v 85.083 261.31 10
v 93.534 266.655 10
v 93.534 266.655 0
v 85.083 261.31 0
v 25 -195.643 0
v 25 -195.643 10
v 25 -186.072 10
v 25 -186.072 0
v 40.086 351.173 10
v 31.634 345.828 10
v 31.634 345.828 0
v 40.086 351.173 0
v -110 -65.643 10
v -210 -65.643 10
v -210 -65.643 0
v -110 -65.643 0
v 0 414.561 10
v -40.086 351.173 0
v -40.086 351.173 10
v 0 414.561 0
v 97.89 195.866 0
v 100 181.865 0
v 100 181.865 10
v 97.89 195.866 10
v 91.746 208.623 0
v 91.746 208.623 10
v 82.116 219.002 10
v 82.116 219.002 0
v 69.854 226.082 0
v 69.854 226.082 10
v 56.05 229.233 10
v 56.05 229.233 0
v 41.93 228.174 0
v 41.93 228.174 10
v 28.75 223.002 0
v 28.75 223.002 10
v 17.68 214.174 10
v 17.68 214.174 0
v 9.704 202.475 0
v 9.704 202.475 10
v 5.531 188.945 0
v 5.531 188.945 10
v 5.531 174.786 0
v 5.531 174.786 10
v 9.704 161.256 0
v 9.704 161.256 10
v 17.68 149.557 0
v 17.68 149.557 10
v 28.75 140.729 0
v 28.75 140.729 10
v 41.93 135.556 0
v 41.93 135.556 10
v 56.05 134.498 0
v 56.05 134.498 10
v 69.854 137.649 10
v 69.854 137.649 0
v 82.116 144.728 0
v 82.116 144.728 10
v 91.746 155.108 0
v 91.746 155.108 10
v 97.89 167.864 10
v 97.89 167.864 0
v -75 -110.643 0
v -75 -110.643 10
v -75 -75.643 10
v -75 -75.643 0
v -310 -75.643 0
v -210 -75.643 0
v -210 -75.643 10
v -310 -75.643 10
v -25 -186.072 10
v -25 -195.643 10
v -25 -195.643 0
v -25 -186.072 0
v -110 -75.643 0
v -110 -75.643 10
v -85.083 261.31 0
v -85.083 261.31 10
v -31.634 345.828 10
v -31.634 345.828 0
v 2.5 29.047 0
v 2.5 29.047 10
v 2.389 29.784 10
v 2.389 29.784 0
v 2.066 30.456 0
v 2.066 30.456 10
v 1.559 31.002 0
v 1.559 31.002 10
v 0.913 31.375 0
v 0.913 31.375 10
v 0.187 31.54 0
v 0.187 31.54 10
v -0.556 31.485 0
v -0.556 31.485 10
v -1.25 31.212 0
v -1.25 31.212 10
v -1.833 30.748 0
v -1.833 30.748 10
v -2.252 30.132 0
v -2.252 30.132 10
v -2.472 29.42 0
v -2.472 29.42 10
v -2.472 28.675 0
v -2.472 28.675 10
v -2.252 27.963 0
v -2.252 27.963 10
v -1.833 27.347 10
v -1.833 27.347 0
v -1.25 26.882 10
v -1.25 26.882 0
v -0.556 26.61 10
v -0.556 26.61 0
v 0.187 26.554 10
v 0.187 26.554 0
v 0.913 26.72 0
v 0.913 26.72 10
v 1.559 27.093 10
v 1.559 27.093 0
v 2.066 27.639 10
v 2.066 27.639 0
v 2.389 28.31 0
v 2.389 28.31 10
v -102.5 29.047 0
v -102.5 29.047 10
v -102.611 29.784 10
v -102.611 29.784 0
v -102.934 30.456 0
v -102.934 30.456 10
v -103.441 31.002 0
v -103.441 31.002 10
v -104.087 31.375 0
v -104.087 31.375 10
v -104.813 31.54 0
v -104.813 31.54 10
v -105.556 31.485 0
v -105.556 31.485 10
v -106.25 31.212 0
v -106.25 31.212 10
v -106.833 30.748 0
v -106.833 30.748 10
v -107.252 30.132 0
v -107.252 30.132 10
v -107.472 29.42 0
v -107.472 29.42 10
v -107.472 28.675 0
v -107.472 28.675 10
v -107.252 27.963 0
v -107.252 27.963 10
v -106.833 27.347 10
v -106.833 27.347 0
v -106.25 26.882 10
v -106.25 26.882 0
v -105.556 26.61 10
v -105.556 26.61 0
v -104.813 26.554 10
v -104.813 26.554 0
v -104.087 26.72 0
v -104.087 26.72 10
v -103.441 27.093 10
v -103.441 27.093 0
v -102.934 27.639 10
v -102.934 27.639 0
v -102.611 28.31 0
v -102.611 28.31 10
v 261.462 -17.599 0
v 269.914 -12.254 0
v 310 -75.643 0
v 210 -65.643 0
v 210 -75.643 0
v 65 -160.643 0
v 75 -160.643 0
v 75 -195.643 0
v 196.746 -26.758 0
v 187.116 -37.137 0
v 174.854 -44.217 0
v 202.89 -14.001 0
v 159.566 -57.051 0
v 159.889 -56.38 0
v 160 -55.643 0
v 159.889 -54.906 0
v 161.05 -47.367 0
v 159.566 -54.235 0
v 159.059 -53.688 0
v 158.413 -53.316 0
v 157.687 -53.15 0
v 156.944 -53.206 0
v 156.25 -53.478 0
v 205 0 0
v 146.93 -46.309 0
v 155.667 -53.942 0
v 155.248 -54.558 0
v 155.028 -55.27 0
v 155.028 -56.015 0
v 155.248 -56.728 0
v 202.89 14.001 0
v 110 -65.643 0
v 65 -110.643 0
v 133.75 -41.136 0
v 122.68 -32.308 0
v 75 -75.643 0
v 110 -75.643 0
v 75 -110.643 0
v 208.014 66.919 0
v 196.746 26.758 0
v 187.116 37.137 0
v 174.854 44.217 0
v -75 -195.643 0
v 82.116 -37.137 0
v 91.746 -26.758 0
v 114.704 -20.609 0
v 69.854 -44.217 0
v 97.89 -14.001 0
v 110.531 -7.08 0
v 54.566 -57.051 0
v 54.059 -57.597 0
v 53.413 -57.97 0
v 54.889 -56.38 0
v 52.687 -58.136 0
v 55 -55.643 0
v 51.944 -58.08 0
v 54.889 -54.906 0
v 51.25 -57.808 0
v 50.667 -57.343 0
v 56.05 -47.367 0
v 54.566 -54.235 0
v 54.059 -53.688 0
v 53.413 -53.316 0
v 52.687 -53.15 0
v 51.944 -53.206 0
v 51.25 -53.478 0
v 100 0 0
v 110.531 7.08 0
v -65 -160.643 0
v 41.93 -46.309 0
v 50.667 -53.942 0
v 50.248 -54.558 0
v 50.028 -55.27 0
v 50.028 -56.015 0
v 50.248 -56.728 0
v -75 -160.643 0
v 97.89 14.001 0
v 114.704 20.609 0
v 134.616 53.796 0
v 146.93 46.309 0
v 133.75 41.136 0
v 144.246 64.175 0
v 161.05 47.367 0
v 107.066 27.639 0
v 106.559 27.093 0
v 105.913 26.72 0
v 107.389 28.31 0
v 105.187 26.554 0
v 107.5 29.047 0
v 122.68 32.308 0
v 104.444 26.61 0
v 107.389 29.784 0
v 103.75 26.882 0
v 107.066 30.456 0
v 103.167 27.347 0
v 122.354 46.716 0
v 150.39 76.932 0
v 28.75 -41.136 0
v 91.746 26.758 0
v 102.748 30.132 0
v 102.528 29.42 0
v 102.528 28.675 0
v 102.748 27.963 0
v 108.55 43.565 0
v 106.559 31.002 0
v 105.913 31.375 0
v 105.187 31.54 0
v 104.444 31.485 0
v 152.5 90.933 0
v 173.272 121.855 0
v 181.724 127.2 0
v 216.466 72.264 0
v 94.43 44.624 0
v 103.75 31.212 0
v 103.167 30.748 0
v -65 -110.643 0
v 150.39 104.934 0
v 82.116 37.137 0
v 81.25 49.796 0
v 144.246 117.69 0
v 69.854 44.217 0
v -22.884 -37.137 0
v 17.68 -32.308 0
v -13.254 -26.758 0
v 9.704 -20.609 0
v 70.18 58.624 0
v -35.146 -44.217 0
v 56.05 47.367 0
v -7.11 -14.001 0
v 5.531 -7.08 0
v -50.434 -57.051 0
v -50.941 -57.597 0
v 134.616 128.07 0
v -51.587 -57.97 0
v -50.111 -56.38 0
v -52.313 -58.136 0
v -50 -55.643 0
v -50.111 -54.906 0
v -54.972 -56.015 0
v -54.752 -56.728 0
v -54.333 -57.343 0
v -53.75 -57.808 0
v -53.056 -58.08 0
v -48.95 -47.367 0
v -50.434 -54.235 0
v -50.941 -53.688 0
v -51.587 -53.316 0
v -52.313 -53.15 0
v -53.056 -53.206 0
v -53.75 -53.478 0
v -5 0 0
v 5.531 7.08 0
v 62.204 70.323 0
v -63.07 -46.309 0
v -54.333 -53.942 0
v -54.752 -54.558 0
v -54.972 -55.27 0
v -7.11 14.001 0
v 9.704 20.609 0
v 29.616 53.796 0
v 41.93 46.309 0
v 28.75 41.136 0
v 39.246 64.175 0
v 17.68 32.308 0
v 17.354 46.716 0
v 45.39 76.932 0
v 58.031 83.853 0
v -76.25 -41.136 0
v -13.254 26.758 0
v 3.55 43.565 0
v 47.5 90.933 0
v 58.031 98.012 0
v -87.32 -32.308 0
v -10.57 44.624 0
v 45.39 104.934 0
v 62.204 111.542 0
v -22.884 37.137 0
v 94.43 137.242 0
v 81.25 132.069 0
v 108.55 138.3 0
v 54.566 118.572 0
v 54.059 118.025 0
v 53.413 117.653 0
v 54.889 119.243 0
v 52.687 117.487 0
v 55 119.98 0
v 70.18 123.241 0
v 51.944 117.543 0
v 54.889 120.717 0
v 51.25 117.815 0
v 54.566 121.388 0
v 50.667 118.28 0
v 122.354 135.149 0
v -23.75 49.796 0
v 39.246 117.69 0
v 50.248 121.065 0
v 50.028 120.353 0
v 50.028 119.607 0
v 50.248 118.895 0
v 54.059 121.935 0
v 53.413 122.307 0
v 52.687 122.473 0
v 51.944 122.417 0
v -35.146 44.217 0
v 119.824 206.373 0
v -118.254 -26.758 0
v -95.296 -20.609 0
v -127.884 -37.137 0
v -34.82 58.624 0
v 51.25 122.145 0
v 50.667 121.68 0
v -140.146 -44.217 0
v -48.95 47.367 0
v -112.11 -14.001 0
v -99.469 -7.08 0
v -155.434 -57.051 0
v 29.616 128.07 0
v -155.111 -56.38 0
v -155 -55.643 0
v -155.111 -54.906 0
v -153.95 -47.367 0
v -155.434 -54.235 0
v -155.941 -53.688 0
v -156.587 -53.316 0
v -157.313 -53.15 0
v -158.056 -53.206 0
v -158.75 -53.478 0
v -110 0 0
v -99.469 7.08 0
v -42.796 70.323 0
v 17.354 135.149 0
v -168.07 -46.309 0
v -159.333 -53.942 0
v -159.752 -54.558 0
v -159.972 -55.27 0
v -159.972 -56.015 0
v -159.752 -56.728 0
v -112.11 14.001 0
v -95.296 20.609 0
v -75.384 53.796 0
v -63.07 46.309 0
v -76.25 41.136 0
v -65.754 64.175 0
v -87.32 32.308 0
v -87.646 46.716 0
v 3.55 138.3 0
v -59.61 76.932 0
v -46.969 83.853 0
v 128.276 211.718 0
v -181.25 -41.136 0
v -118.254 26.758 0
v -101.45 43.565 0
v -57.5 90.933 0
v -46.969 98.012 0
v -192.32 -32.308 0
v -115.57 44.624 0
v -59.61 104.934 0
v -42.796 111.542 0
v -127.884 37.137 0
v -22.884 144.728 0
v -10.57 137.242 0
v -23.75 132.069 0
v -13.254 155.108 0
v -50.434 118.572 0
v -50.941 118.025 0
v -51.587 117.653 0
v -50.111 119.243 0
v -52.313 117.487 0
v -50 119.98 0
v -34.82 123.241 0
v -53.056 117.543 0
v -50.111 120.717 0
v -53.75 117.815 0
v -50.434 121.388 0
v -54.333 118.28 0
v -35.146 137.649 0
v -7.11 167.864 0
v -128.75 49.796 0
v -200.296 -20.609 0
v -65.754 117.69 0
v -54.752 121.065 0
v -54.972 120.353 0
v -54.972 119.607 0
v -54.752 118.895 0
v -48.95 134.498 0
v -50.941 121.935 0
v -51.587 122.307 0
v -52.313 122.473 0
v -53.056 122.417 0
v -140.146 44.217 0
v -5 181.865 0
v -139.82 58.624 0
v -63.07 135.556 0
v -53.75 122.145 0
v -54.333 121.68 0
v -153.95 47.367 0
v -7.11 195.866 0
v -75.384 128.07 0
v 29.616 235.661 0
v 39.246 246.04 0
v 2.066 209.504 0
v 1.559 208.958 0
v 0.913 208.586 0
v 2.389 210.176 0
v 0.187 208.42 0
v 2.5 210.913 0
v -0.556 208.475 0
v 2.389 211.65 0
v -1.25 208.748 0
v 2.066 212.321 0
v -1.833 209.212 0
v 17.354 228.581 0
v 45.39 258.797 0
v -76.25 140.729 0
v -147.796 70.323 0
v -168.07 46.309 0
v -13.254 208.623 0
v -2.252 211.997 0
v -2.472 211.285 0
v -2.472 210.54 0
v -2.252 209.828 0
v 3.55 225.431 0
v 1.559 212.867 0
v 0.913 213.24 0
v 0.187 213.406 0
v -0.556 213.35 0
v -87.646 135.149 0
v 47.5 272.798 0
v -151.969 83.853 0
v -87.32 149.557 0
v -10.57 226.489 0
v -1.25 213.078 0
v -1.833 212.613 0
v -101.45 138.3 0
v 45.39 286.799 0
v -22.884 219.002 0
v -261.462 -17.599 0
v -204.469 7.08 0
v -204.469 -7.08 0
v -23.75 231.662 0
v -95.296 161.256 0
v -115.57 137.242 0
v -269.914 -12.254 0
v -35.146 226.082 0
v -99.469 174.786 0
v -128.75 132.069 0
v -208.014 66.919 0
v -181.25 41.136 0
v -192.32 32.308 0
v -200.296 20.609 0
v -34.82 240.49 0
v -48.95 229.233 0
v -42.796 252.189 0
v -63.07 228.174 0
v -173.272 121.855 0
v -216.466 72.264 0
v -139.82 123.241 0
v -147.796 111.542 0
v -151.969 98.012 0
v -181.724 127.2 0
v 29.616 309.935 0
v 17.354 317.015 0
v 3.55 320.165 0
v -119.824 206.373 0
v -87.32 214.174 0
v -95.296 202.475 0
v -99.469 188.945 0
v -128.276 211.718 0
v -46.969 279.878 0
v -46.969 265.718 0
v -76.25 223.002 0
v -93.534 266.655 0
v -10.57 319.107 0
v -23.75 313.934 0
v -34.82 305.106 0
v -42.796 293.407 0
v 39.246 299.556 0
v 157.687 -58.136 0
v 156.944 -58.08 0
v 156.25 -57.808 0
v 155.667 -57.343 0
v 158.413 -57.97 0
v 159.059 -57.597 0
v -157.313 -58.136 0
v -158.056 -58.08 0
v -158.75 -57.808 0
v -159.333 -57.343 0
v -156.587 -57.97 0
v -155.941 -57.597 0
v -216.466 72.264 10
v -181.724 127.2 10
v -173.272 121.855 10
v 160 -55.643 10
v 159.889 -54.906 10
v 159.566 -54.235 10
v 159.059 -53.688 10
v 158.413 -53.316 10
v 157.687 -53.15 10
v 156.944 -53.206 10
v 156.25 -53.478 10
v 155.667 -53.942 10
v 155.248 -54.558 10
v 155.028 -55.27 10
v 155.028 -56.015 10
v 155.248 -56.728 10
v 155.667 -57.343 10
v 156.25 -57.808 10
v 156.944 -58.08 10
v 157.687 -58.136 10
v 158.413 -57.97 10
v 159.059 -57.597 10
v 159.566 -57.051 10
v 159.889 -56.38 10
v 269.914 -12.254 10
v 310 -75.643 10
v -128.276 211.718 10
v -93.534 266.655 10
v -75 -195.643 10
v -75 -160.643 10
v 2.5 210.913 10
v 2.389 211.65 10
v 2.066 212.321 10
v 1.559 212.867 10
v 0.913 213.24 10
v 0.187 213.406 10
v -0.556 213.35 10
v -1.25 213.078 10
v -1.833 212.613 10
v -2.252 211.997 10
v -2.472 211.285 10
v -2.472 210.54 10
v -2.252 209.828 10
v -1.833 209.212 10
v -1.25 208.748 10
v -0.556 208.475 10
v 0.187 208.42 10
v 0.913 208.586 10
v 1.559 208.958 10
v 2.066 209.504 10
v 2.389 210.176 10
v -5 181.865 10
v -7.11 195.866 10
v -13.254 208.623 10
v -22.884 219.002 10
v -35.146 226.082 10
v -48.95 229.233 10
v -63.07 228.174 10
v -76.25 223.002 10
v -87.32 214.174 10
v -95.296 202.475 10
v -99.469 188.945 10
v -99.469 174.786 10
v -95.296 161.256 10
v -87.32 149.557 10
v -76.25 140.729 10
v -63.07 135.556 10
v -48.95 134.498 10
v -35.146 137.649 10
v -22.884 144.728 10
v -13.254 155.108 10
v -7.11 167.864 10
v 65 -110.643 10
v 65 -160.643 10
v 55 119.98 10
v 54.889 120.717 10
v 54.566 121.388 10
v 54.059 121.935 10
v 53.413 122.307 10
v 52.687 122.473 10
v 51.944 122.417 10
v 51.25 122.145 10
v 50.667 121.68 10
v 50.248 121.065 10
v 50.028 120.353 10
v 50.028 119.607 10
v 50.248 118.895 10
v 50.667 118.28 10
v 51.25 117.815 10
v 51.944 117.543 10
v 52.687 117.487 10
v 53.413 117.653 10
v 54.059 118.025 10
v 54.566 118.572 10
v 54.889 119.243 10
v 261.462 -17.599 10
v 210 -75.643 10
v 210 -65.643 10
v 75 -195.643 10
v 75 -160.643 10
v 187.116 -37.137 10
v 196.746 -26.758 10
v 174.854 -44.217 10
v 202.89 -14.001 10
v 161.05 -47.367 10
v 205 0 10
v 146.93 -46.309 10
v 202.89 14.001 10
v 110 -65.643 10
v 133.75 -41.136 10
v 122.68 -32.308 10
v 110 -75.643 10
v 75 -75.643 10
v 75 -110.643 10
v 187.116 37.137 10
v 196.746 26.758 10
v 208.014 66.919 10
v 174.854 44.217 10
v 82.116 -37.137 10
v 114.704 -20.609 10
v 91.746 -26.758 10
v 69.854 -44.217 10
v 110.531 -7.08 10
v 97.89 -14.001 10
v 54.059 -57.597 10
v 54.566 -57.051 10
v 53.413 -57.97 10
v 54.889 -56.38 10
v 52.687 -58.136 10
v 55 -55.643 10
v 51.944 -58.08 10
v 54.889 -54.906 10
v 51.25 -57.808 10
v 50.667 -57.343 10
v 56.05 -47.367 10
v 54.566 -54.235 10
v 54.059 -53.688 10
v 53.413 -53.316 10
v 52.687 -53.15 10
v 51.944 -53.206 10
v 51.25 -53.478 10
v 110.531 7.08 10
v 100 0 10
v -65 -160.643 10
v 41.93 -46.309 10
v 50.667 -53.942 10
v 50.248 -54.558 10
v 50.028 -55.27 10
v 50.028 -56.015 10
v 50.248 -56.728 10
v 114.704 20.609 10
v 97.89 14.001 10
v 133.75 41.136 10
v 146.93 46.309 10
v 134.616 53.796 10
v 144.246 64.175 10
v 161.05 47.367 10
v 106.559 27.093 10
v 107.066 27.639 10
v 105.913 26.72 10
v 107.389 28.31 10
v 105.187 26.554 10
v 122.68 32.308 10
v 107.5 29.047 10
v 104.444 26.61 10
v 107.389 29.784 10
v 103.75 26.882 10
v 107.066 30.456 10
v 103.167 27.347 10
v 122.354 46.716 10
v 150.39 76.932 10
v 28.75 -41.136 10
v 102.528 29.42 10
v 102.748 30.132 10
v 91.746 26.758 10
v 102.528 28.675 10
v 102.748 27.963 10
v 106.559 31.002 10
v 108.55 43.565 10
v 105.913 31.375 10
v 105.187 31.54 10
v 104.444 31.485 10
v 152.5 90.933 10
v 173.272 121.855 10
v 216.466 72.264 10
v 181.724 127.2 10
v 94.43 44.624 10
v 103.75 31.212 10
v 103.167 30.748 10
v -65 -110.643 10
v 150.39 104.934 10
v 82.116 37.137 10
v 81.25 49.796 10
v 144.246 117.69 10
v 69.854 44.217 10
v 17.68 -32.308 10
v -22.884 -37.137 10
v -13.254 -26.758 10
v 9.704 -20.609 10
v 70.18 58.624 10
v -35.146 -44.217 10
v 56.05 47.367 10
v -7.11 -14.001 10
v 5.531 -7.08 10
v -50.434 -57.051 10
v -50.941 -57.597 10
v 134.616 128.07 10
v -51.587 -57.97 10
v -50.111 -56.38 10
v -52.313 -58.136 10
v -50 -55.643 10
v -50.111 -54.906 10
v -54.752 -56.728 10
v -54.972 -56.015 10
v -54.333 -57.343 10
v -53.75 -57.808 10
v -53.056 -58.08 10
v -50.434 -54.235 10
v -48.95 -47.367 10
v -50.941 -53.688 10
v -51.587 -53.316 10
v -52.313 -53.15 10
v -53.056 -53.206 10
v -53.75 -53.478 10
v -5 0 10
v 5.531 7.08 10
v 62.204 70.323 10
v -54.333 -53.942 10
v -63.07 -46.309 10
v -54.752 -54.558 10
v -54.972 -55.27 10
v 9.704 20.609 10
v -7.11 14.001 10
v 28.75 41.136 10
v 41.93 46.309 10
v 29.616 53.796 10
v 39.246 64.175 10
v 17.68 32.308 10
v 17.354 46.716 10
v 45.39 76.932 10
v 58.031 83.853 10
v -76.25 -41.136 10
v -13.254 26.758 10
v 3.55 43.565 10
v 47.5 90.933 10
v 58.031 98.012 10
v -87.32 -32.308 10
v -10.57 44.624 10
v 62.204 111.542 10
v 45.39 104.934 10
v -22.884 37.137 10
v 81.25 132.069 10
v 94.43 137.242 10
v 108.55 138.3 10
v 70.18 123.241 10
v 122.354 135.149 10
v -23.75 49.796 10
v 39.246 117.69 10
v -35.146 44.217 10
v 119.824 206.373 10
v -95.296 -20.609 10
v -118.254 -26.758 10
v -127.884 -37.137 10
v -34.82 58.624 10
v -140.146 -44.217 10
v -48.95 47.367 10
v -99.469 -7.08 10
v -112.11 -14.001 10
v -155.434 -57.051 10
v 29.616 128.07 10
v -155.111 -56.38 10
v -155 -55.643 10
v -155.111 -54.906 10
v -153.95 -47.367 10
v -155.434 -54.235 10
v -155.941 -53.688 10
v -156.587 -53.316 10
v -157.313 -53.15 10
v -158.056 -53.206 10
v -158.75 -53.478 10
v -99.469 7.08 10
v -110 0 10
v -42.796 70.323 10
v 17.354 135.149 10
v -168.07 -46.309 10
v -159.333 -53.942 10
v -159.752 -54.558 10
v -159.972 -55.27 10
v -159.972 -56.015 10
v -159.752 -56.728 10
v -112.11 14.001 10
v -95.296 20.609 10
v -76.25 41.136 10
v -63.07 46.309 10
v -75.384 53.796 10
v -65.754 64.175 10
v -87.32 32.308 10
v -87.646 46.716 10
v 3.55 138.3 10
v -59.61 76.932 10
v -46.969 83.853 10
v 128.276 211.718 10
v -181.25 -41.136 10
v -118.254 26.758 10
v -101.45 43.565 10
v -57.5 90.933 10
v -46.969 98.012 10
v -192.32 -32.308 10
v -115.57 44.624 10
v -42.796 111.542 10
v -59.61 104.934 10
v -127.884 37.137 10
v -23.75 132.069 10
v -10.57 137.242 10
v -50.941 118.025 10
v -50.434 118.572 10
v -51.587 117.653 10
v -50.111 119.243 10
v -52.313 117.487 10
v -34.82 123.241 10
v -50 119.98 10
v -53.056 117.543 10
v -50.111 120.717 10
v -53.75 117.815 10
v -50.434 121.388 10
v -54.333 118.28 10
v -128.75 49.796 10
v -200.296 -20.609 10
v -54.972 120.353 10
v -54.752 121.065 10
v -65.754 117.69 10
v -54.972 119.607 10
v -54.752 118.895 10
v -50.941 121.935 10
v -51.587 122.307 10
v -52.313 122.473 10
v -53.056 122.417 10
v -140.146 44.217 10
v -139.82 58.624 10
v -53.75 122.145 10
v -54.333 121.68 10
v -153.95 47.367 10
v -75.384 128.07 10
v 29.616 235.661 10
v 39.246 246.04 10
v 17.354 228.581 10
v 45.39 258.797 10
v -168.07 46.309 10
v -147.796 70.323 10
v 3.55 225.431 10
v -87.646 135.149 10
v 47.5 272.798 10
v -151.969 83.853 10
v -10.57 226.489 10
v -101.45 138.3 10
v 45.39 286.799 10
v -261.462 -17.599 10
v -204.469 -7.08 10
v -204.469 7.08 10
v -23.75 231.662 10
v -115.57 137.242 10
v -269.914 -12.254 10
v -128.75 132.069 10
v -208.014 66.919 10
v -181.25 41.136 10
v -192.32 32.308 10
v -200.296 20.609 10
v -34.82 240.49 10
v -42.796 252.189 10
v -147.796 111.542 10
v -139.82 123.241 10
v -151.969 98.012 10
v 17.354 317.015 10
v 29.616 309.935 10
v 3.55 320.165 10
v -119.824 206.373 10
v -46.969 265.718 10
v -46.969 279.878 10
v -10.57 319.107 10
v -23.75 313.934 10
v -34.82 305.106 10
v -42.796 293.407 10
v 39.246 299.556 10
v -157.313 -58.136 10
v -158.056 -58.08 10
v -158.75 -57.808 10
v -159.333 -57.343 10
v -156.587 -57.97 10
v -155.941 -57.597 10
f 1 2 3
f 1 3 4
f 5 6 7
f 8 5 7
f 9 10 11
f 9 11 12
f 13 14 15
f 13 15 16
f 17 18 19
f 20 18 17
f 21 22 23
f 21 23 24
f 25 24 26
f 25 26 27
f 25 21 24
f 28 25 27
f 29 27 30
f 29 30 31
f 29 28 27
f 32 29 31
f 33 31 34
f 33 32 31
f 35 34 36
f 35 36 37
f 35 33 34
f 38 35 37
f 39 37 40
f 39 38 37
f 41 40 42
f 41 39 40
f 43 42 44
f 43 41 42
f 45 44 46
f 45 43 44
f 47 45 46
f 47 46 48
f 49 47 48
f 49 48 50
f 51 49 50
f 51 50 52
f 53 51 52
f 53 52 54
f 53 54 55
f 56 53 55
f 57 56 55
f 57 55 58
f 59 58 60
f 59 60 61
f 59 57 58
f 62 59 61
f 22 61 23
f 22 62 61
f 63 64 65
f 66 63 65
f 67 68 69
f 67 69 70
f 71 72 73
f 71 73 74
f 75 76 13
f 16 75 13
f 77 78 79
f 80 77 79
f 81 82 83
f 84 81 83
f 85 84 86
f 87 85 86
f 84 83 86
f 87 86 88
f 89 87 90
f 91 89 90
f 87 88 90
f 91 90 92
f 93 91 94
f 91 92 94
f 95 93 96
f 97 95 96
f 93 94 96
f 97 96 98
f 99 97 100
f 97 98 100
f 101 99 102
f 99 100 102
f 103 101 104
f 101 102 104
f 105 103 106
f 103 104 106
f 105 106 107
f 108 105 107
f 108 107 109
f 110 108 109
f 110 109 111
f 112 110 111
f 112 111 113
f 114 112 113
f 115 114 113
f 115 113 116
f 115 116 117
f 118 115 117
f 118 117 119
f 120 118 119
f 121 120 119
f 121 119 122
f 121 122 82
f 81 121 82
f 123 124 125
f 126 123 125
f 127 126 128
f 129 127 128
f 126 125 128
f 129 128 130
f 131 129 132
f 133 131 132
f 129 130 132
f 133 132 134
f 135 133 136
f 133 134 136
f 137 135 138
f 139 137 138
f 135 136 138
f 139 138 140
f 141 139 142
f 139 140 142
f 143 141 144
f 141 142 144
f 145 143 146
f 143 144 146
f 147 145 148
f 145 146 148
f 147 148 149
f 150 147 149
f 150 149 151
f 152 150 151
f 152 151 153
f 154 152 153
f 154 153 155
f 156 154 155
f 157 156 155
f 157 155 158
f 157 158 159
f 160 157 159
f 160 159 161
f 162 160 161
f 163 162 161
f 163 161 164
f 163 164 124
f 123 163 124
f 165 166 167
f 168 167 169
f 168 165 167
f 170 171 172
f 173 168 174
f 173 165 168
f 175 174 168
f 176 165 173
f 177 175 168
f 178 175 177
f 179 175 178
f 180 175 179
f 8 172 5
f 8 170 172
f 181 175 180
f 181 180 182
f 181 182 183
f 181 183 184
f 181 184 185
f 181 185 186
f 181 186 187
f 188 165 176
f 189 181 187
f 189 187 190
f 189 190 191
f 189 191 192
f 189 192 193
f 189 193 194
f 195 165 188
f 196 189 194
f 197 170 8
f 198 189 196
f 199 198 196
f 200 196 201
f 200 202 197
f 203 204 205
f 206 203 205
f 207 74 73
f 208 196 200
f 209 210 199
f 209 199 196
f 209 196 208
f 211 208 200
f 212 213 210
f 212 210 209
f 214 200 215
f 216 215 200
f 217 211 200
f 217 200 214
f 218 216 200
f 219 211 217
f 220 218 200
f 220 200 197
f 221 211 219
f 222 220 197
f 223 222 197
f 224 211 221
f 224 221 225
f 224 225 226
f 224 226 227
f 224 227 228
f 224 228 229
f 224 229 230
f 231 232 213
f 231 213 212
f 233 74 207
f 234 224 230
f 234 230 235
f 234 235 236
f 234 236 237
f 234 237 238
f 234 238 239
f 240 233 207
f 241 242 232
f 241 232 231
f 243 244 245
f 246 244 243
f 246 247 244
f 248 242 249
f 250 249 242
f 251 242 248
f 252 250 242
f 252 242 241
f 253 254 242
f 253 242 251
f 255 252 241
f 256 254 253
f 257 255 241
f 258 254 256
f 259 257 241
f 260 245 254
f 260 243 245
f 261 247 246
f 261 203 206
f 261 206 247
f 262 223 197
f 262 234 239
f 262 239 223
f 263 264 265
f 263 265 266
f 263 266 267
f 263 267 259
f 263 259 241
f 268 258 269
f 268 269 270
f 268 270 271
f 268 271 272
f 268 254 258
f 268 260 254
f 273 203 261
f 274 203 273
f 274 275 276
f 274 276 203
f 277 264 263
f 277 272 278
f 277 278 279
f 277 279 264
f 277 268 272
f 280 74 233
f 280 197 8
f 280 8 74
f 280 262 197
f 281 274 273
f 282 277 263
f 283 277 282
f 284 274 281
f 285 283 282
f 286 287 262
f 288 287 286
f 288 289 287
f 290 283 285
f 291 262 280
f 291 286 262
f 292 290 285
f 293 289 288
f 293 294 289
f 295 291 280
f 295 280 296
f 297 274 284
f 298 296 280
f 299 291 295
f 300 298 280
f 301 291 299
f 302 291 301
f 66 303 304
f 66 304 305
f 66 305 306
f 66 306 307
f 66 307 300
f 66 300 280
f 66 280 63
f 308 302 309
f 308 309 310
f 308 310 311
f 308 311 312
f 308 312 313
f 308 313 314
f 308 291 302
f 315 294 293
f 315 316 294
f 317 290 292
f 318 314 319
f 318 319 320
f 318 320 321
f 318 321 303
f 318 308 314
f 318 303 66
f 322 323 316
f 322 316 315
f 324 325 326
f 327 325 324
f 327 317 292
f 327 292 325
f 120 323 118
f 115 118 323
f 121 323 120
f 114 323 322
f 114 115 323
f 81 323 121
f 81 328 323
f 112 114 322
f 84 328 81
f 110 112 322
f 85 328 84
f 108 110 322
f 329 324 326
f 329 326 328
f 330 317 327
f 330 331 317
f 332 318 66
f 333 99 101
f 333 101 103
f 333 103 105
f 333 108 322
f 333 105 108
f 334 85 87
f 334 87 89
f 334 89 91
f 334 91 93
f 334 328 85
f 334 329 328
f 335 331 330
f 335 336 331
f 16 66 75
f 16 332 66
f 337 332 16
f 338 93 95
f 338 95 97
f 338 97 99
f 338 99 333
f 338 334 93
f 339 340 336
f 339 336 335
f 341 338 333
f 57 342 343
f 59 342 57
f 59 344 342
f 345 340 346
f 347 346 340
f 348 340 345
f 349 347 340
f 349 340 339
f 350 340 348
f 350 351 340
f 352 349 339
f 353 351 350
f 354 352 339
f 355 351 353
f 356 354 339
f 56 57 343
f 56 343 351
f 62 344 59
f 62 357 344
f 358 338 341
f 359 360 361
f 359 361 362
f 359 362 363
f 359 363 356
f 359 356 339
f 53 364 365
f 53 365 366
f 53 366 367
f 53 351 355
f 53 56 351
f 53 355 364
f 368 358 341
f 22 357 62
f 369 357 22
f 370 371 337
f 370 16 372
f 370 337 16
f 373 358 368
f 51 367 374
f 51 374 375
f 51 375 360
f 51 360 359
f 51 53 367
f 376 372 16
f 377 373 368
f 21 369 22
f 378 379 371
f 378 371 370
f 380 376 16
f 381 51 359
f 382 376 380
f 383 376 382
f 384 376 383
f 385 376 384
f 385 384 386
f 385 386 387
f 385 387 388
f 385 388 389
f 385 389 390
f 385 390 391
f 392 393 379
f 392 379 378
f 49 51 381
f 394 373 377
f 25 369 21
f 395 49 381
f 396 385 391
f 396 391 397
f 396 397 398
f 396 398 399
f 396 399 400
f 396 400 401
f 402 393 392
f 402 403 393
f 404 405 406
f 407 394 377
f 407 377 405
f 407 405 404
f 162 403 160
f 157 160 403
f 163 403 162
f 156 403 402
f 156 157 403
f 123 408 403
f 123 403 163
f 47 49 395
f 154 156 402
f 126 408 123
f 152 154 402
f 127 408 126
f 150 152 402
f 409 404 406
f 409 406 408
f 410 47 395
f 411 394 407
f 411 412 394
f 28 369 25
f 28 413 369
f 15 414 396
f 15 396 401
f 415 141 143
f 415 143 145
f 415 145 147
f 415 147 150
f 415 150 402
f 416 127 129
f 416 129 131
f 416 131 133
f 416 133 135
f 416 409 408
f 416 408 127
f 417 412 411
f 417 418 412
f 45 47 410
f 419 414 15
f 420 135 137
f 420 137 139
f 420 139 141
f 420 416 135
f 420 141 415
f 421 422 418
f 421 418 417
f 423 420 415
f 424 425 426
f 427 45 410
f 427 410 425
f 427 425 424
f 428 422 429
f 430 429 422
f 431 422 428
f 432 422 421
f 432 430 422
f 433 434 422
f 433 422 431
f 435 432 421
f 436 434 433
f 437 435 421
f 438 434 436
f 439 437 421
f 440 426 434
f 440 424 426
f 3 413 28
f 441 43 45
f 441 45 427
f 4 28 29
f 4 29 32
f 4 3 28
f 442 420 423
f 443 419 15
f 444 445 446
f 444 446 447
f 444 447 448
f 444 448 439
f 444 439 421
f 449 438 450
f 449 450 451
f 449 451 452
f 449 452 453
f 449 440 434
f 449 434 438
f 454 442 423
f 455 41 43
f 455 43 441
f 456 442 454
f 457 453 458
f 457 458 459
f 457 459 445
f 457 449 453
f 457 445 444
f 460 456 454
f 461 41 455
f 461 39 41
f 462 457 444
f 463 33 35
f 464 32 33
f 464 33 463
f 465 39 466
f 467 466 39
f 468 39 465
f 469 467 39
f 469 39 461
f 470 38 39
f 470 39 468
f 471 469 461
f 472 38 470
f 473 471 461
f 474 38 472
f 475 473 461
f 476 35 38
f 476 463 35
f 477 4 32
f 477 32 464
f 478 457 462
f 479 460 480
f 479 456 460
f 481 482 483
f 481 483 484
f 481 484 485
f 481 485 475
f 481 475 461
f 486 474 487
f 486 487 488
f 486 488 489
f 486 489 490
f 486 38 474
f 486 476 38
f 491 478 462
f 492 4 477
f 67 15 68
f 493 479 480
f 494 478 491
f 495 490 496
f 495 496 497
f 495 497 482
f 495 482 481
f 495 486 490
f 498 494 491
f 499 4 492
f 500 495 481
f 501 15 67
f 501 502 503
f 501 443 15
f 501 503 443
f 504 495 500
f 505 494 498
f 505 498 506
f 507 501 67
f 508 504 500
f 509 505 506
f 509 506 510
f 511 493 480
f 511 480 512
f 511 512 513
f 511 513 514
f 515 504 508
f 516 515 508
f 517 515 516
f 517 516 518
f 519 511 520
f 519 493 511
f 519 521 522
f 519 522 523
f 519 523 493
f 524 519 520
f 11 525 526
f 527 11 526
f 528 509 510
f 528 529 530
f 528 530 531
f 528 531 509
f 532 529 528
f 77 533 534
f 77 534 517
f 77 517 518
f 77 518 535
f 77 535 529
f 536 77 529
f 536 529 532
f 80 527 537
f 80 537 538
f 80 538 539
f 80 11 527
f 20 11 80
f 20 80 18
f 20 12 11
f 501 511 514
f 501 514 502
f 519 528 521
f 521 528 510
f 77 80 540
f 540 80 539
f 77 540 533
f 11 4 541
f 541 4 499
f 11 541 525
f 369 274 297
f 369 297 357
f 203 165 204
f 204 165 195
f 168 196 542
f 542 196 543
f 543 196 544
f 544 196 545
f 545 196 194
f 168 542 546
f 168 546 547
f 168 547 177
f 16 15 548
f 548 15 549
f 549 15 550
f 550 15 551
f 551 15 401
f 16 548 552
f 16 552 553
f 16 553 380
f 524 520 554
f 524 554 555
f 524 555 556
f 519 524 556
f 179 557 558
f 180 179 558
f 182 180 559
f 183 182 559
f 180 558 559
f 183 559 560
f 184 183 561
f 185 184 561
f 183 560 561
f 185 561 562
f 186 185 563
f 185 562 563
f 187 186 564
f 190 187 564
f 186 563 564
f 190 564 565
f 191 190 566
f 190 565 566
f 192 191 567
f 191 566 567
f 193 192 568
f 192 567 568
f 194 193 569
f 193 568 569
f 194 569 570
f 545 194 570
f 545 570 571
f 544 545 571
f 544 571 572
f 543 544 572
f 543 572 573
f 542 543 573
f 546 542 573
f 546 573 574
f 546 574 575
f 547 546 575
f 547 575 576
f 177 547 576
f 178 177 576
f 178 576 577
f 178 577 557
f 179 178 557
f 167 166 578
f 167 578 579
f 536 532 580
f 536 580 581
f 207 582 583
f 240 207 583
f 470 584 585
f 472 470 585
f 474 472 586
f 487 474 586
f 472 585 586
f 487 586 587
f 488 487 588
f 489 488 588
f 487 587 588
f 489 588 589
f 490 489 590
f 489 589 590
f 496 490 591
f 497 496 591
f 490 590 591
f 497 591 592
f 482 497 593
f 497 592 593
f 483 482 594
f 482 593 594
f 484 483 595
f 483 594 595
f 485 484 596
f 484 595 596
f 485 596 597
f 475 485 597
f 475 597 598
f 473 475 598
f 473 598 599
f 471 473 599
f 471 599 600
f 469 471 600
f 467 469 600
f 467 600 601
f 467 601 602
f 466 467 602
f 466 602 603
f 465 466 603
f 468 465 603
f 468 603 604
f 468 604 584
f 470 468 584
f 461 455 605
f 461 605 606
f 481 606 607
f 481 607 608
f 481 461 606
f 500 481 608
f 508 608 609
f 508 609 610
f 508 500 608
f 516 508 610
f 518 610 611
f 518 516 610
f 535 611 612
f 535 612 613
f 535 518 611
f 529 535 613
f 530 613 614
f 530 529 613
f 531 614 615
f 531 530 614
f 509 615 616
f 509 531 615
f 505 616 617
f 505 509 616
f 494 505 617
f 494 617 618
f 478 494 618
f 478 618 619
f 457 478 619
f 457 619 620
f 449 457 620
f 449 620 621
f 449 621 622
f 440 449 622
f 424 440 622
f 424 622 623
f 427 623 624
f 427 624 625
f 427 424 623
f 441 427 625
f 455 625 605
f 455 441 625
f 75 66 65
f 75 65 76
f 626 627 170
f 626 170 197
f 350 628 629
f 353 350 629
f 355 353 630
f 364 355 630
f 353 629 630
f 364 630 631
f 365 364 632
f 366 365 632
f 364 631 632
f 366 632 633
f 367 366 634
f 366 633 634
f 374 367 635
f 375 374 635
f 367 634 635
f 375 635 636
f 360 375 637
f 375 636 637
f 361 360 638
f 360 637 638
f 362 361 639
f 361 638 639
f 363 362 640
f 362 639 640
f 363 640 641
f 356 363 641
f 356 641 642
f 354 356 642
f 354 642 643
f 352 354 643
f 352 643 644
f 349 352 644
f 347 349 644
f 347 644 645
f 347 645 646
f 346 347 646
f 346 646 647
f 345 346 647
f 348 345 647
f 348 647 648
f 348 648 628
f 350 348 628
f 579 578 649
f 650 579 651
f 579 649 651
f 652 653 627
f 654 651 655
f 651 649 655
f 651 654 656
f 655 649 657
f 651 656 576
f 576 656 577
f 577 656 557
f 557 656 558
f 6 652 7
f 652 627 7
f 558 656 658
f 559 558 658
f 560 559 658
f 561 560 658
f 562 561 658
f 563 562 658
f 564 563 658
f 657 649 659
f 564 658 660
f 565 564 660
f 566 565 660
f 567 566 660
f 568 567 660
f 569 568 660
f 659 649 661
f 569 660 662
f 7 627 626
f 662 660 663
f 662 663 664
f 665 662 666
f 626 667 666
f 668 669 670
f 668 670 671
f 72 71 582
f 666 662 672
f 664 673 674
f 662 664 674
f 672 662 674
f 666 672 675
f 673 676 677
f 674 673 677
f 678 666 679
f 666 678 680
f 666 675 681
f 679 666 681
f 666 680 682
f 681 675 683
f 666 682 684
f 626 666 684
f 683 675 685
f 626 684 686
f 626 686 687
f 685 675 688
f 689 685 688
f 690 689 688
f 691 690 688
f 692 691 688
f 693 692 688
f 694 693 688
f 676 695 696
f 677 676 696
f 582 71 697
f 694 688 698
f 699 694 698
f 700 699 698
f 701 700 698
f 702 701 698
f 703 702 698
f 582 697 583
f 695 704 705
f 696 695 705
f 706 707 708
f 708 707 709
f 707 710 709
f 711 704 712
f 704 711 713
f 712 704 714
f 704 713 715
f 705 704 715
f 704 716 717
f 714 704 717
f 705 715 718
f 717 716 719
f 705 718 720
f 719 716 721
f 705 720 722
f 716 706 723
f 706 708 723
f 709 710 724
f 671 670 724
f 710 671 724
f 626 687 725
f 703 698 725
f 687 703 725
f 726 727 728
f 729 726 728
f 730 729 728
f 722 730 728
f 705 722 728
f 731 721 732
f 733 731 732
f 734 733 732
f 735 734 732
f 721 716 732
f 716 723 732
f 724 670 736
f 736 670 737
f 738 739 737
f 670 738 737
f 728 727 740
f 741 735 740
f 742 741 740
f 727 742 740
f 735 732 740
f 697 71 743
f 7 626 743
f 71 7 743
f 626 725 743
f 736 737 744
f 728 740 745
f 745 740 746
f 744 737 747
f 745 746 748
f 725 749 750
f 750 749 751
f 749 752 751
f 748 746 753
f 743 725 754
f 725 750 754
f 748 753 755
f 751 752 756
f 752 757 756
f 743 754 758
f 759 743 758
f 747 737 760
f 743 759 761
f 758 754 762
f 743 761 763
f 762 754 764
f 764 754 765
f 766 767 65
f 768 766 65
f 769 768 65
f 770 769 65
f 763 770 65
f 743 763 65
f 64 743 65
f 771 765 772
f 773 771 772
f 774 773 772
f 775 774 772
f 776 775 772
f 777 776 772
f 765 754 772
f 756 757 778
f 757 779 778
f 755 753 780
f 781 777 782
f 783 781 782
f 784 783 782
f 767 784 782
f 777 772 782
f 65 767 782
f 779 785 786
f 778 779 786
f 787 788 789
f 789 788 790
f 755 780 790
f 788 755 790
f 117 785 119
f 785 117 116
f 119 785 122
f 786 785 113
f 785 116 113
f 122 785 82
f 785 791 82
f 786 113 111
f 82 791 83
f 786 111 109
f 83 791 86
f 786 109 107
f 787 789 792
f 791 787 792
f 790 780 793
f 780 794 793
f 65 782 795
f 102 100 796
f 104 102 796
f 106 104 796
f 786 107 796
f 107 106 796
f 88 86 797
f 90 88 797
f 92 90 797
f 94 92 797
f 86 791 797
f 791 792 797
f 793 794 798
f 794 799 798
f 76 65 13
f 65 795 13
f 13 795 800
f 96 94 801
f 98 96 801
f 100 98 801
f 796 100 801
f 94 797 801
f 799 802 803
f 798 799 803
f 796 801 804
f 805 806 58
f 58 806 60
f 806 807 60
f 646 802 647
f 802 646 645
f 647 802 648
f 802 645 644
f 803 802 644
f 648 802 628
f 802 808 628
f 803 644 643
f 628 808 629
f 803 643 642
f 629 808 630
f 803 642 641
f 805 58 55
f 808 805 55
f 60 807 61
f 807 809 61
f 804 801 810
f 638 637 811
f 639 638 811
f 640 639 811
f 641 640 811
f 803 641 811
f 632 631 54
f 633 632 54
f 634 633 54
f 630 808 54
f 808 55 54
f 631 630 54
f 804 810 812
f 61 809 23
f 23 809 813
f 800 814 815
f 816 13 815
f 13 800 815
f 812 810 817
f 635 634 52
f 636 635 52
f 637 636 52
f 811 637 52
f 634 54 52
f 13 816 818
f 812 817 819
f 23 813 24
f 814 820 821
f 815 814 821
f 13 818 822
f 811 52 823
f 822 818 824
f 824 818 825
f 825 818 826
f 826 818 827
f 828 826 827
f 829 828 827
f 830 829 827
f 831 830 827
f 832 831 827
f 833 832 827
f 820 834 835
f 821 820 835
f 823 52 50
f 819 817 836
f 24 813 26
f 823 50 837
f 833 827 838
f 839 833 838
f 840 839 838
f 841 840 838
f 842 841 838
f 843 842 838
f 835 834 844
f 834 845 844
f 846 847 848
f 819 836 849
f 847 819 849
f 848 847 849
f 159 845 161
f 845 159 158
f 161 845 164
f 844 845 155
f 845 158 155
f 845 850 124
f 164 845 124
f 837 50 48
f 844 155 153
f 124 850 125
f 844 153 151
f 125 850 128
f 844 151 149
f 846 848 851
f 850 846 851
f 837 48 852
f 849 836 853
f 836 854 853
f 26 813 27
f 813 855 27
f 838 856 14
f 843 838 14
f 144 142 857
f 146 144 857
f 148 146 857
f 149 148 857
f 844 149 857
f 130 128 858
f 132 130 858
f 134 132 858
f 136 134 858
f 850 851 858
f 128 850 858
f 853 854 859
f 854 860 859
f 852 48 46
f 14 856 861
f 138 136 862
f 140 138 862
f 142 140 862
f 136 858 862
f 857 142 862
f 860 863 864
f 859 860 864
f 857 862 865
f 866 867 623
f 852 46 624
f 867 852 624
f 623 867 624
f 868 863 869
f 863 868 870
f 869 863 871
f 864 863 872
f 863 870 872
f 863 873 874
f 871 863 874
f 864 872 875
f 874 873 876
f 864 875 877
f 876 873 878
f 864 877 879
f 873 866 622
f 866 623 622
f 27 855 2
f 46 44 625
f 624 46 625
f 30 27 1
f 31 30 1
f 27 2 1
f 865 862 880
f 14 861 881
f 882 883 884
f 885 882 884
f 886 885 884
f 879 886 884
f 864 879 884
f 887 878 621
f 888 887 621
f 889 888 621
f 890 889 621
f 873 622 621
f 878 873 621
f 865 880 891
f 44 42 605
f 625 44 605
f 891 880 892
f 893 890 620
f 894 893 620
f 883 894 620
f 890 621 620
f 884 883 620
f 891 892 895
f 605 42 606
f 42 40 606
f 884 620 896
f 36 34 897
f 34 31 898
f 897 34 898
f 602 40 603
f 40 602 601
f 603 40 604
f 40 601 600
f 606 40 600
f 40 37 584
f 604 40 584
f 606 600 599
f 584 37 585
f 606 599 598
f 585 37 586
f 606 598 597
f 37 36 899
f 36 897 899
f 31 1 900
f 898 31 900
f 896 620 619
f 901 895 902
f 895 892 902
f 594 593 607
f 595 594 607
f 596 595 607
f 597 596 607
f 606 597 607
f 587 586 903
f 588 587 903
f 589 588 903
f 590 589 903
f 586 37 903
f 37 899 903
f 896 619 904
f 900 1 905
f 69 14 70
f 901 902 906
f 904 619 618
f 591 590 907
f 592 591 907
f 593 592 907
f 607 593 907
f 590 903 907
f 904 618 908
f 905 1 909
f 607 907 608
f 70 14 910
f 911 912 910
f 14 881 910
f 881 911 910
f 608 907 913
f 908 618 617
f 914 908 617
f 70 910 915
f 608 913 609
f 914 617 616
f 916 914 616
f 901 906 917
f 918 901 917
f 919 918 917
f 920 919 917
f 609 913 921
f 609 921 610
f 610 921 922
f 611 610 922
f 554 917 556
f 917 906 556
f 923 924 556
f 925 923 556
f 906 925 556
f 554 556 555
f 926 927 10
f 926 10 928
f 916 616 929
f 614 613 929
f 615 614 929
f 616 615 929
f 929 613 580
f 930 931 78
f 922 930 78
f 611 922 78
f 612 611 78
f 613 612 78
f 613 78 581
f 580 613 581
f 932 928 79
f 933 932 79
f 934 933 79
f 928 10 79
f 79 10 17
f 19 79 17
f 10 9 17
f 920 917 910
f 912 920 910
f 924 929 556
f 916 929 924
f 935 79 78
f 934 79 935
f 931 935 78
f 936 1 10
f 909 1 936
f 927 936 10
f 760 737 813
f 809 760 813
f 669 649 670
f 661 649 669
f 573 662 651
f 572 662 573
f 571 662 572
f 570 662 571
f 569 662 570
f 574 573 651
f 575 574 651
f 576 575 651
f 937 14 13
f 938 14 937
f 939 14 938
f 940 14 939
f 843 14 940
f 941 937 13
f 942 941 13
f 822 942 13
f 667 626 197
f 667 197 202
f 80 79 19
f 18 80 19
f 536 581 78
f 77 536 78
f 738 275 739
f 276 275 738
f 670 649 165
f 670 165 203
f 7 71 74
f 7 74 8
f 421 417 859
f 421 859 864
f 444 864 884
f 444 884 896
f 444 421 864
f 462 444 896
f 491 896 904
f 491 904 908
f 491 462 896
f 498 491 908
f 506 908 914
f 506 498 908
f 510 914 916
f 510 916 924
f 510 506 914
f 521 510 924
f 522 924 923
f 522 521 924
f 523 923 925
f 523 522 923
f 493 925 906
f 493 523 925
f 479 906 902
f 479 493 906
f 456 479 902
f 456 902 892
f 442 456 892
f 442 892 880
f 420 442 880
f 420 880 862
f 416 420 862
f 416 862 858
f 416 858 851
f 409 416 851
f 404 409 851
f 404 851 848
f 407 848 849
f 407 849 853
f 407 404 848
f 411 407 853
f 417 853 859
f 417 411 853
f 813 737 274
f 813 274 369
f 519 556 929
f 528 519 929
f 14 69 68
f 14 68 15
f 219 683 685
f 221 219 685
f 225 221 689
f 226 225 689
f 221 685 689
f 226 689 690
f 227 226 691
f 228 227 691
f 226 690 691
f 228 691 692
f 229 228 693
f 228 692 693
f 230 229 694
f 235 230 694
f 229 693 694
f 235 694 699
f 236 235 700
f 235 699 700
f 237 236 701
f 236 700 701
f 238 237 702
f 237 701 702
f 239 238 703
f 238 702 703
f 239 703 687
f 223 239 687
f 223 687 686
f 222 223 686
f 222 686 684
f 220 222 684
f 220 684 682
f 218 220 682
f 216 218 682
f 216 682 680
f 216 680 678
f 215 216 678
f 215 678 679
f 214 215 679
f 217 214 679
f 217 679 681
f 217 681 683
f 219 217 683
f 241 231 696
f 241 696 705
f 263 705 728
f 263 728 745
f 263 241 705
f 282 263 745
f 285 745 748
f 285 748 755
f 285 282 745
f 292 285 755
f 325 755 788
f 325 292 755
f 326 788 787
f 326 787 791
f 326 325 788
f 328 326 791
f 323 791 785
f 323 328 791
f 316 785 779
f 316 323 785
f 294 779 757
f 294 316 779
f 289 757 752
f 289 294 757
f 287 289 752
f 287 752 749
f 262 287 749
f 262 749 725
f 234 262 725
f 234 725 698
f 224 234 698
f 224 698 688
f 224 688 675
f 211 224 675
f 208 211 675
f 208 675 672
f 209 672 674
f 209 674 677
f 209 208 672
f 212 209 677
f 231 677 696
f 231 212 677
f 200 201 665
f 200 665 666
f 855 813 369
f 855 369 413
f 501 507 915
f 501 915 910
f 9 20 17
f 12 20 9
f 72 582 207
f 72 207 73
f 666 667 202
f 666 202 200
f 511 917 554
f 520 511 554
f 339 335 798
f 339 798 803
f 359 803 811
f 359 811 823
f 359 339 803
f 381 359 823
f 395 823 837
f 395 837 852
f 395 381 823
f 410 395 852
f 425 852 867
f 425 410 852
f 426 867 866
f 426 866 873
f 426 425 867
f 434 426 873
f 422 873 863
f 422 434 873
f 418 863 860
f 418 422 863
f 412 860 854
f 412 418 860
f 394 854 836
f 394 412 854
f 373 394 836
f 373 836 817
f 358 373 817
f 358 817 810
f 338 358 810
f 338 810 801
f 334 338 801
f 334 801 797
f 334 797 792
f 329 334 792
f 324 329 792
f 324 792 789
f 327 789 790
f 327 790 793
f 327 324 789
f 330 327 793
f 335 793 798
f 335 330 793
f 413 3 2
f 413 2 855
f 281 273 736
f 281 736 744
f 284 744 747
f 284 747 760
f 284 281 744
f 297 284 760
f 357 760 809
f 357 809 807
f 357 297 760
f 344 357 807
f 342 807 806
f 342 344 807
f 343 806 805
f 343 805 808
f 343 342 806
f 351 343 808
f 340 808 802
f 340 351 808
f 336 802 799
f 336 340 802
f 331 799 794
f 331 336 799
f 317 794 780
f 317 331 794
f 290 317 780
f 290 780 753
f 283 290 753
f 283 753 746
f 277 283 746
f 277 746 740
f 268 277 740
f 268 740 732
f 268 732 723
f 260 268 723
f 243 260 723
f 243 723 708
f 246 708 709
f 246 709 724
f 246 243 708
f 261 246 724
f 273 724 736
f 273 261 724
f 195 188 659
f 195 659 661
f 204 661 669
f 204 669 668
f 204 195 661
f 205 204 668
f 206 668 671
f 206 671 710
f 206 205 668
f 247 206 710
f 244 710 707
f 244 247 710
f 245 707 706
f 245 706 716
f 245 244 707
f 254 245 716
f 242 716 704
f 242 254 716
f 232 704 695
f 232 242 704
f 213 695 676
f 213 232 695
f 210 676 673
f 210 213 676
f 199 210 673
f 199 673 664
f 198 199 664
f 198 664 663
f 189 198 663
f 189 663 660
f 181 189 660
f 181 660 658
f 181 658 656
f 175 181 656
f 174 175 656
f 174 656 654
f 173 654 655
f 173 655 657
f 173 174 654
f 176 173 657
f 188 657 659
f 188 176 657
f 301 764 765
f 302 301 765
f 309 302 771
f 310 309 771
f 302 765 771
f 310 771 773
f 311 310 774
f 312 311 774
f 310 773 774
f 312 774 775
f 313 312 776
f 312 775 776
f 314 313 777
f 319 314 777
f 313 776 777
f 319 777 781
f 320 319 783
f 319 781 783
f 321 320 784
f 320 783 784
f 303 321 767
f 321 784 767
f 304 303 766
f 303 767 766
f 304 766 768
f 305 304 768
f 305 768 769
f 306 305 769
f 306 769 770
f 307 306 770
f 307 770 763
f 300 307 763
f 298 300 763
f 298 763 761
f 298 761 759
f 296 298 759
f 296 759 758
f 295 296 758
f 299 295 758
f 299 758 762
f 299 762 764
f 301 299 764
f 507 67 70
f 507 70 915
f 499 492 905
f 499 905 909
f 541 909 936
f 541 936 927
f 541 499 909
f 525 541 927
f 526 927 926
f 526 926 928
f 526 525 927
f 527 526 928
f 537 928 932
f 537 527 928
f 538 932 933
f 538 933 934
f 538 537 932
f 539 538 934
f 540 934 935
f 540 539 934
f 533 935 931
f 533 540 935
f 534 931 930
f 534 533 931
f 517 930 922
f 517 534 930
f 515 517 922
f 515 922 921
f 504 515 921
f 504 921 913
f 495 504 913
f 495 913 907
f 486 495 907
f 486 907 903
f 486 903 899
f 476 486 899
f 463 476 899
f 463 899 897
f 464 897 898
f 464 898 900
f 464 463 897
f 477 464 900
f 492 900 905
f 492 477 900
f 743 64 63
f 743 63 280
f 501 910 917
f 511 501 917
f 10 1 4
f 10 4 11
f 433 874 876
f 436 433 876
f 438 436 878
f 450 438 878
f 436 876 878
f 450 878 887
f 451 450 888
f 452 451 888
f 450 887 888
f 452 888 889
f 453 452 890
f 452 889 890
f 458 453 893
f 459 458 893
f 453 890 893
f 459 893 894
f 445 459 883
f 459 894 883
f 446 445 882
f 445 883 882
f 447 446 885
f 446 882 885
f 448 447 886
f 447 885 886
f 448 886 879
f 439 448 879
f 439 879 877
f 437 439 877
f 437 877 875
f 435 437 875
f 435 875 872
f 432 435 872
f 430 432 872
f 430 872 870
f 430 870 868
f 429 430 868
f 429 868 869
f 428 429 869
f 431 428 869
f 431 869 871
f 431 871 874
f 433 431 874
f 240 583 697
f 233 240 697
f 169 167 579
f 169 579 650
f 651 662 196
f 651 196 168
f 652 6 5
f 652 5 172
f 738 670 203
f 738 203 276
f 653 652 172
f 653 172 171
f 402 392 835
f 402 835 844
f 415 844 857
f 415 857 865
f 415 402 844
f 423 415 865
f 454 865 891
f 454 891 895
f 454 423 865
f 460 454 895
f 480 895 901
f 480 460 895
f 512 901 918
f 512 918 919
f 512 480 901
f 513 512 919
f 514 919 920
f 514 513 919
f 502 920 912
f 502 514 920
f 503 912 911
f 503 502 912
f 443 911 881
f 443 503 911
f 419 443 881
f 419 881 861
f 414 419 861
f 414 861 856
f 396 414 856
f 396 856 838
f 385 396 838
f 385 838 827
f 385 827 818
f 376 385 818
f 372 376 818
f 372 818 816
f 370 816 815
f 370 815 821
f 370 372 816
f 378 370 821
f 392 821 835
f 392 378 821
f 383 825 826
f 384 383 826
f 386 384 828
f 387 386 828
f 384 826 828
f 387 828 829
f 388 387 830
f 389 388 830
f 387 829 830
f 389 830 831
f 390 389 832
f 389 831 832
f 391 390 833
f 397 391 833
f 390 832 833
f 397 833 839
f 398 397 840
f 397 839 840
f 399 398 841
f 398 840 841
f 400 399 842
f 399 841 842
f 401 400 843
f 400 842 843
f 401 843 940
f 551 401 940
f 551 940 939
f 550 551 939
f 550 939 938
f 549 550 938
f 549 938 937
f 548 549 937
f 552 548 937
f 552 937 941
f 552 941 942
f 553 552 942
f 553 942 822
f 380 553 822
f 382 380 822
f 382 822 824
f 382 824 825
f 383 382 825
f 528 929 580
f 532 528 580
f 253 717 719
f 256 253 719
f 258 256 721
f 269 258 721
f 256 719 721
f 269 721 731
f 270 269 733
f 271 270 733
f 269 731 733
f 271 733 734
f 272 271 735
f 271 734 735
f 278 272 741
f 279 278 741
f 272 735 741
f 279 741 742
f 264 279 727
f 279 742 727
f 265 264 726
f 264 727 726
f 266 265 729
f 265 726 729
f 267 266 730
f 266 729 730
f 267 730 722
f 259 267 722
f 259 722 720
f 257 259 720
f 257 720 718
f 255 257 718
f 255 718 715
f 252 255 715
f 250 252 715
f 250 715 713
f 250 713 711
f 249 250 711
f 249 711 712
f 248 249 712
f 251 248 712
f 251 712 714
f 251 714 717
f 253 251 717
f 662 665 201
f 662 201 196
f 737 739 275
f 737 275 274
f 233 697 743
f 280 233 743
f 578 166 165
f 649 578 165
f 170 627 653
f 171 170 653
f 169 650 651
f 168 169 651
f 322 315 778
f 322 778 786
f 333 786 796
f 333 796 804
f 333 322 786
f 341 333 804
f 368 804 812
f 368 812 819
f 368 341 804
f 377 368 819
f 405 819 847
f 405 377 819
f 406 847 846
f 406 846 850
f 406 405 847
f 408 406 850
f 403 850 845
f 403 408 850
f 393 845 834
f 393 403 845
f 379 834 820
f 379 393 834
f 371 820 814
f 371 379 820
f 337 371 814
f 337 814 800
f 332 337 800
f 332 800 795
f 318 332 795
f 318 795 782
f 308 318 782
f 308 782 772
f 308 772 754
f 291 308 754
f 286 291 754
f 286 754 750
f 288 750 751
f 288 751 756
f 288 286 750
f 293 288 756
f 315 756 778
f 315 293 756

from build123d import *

# Parameters (mm, degrees)
ESQUISSE1_R             = 47.5
BOSS_EXTRU_1_DEPTH      = 10
ESQUISSE3_W             = 100
ESQUISSE3_H             = 10
ENL_V_MAT_EXTRU_1_DEPTH = 11
ESQUISSE4_R             = 2.5
ENL_V_MAT_EXTRU_2_DEPTH = 11
ESQUISSE6_W             = 150
ESQUISSE6_H             = 120
BOSS_EXTRU_2_DEPTH      = 10
ESQUISSE7_W             = 10
ESQUISSE7_H             = 50
ESQUISSE7_W_2           = 50
ESQUISSE7_H_2           = 9.570800355
ENL_V_MAT_EXTRU_3_DEPTH = 10


with BuildPart() as part:
    # Esquisse1 → Boss.-Extru.1 (new body)
    with BuildSketch(Plane.XY):
        Polygon((-310, -75.642859016), (0, 414.561180135), (310, -75.642859016), align=None)
        with Locations((-157.5, 0)):
            Circle(ESQUISSE1_R, mode=Mode.SUBTRACT)
        with Locations((-52.5, 0)):
            Circle(ESQUISSE1_R, mode=Mode.SUBTRACT)
        with Locations((52.5, 0)):
            Circle(ESQUISSE1_R, mode=Mode.SUBTRACT)
        with Locations((157.5, 0)):
            Circle(ESQUISSE1_R, mode=Mode.SUBTRACT)
        with Locations((-105, 90.932667397)):
            Circle(ESQUISSE1_R, mode=Mode.SUBTRACT)
        with Locations((0, 90.932667397)):
            Circle(ESQUISSE1_R, mode=Mode.SUBTRACT)
        with Locations((105, 90.932667397)):
            Circle(ESQUISSE1_R, mode=Mode.SUBTRACT)
        with Locations((-52.5, 181.865334795)):
            Circle(ESQUISSE1_R, mode=Mode.SUBTRACT)
        with Locations((52.5, 181.865334795)):
            Circle(ESQUISSE1_R, mode=Mode.SUBTRACT)
        with Locations((0, 272.798002192)):
            Circle(ESQUISSE1_R, mode=Mode.SUBTRACT)
    extrude(amount=BOSS_EXTRU_1_DEPTH)

    # Esquisse3 → Enlèv. mat.-Extru.1 (cut, through all)
    with BuildSketch(Plane.XY.offset(10)):
        Polygon((-269.913793103, -12.254405678), (-261.461999325, -17.599233264), (-208.013723463, 66.918704521), (-216.465517241, 72.263532107), align=None)
        Polygon((-181.724137931, 127.200191667), (-173.272344153, 121.855364081), (-119.82406829, 206.373301865), (-128.275862069, 211.718129452), align=None)
        Polygon((-93.534482759, 266.654789012), (-85.08268898, 261.309961425), (-31.634413118, 345.82789921), (-40.086206897, 351.172726796), align=None)
        Polygon((269.913793103, -12.254405678), (261.461999325, -17.599233264), (208.013723463, 66.918704521), (216.465517241, 72.263532107), align=None)
        Polygon((181.724137931, 127.200191667), (173.272344153, 121.855364081), (119.82406829, 206.373301865), (128.275862069, 211.718129452), align=None)
        Polygon((93.534482759, 266.654789012), (85.08268898, 261.309961425), (31.634413118, 345.82789921), (40.086206897, 351.172726796), align=None)
        with Locations((-160, -70.642859016)):
            Rectangle(ESQUISSE3_W, ESQUISSE3_H)
        with Locations((160, -70.642859016)):
            Rectangle(ESQUISSE3_W, ESQUISSE3_H)
    extrude(amount=-ENL_V_MAT_EXTRU_1_DEPTH, mode=Mode.SUBTRACT)

    # Esquisse4 → Enlèv. mat.-Extru.2 (cut, through all)
    with BuildSketch(Plane.XY.offset(10)):
        with Locations((-157.5, -55.642859016)):
            Circle(ESQUISSE4_R)
        with Locations((-52.5, -55.642859016)):
            Circle(ESQUISSE4_R)
        with Locations((52.5, -55.642859016)):
            Circle(ESQUISSE4_R)
        with Locations((157.5, -55.642859016)):
            Circle(ESQUISSE4_R)
        with Locations((-105, 29.047375097)):
            Circle(ESQUISSE4_R)
        with Locations((0, 29.047375097)):
            Circle(ESQUISSE4_R)
        with Locations((105, 29.047375097)):
            Circle(ESQUISSE4_R)
        with Locations((-52.5, 119.980042494)):
            Circle(ESQUISSE4_R)
        with Locations((52.5, 119.980042494)):
            Circle(ESQUISSE4_R)
        with Locations((0, 210.912709891)):
            Circle(ESQUISSE4_R)
    extrude(amount=-ENL_V_MAT_EXTRU_2_DEPTH, mode=Mode.SUBTRACT)

    # Esquisse6 → Boss.-Extru.2 (add)
    with BuildSketch(Plane.XY.offset(10)):
        with Locations((0, -135.642859016)):
            Rectangle(ESQUISSE6_W, ESQUISSE6_H)
    extrude(amount=-BOSS_EXTRU_2_DEPTH)

    # Esquisse7 → Enlèv. mat.-Extru.3 (cut)
    with BuildSketch(Plane.XY.offset(10)):
        with Locations((-70, -135.642859016)):
            Rectangle(ESQUISSE7_W, ESQUISSE7_H)
        with Locations((0, -190.857458839)):
            Rectangle(ESQUISSE7_W_2, ESQUISSE7_H_2)
        with Locations((70, -135.642859016)):
            Rectangle(ESQUISSE7_W, ESQUISSE7_H)
    extrude(amount=-ENL_V_MAT_EXTRU_3_DEPTH, mode=Mode.SUBTRACT)


solid = part.part
